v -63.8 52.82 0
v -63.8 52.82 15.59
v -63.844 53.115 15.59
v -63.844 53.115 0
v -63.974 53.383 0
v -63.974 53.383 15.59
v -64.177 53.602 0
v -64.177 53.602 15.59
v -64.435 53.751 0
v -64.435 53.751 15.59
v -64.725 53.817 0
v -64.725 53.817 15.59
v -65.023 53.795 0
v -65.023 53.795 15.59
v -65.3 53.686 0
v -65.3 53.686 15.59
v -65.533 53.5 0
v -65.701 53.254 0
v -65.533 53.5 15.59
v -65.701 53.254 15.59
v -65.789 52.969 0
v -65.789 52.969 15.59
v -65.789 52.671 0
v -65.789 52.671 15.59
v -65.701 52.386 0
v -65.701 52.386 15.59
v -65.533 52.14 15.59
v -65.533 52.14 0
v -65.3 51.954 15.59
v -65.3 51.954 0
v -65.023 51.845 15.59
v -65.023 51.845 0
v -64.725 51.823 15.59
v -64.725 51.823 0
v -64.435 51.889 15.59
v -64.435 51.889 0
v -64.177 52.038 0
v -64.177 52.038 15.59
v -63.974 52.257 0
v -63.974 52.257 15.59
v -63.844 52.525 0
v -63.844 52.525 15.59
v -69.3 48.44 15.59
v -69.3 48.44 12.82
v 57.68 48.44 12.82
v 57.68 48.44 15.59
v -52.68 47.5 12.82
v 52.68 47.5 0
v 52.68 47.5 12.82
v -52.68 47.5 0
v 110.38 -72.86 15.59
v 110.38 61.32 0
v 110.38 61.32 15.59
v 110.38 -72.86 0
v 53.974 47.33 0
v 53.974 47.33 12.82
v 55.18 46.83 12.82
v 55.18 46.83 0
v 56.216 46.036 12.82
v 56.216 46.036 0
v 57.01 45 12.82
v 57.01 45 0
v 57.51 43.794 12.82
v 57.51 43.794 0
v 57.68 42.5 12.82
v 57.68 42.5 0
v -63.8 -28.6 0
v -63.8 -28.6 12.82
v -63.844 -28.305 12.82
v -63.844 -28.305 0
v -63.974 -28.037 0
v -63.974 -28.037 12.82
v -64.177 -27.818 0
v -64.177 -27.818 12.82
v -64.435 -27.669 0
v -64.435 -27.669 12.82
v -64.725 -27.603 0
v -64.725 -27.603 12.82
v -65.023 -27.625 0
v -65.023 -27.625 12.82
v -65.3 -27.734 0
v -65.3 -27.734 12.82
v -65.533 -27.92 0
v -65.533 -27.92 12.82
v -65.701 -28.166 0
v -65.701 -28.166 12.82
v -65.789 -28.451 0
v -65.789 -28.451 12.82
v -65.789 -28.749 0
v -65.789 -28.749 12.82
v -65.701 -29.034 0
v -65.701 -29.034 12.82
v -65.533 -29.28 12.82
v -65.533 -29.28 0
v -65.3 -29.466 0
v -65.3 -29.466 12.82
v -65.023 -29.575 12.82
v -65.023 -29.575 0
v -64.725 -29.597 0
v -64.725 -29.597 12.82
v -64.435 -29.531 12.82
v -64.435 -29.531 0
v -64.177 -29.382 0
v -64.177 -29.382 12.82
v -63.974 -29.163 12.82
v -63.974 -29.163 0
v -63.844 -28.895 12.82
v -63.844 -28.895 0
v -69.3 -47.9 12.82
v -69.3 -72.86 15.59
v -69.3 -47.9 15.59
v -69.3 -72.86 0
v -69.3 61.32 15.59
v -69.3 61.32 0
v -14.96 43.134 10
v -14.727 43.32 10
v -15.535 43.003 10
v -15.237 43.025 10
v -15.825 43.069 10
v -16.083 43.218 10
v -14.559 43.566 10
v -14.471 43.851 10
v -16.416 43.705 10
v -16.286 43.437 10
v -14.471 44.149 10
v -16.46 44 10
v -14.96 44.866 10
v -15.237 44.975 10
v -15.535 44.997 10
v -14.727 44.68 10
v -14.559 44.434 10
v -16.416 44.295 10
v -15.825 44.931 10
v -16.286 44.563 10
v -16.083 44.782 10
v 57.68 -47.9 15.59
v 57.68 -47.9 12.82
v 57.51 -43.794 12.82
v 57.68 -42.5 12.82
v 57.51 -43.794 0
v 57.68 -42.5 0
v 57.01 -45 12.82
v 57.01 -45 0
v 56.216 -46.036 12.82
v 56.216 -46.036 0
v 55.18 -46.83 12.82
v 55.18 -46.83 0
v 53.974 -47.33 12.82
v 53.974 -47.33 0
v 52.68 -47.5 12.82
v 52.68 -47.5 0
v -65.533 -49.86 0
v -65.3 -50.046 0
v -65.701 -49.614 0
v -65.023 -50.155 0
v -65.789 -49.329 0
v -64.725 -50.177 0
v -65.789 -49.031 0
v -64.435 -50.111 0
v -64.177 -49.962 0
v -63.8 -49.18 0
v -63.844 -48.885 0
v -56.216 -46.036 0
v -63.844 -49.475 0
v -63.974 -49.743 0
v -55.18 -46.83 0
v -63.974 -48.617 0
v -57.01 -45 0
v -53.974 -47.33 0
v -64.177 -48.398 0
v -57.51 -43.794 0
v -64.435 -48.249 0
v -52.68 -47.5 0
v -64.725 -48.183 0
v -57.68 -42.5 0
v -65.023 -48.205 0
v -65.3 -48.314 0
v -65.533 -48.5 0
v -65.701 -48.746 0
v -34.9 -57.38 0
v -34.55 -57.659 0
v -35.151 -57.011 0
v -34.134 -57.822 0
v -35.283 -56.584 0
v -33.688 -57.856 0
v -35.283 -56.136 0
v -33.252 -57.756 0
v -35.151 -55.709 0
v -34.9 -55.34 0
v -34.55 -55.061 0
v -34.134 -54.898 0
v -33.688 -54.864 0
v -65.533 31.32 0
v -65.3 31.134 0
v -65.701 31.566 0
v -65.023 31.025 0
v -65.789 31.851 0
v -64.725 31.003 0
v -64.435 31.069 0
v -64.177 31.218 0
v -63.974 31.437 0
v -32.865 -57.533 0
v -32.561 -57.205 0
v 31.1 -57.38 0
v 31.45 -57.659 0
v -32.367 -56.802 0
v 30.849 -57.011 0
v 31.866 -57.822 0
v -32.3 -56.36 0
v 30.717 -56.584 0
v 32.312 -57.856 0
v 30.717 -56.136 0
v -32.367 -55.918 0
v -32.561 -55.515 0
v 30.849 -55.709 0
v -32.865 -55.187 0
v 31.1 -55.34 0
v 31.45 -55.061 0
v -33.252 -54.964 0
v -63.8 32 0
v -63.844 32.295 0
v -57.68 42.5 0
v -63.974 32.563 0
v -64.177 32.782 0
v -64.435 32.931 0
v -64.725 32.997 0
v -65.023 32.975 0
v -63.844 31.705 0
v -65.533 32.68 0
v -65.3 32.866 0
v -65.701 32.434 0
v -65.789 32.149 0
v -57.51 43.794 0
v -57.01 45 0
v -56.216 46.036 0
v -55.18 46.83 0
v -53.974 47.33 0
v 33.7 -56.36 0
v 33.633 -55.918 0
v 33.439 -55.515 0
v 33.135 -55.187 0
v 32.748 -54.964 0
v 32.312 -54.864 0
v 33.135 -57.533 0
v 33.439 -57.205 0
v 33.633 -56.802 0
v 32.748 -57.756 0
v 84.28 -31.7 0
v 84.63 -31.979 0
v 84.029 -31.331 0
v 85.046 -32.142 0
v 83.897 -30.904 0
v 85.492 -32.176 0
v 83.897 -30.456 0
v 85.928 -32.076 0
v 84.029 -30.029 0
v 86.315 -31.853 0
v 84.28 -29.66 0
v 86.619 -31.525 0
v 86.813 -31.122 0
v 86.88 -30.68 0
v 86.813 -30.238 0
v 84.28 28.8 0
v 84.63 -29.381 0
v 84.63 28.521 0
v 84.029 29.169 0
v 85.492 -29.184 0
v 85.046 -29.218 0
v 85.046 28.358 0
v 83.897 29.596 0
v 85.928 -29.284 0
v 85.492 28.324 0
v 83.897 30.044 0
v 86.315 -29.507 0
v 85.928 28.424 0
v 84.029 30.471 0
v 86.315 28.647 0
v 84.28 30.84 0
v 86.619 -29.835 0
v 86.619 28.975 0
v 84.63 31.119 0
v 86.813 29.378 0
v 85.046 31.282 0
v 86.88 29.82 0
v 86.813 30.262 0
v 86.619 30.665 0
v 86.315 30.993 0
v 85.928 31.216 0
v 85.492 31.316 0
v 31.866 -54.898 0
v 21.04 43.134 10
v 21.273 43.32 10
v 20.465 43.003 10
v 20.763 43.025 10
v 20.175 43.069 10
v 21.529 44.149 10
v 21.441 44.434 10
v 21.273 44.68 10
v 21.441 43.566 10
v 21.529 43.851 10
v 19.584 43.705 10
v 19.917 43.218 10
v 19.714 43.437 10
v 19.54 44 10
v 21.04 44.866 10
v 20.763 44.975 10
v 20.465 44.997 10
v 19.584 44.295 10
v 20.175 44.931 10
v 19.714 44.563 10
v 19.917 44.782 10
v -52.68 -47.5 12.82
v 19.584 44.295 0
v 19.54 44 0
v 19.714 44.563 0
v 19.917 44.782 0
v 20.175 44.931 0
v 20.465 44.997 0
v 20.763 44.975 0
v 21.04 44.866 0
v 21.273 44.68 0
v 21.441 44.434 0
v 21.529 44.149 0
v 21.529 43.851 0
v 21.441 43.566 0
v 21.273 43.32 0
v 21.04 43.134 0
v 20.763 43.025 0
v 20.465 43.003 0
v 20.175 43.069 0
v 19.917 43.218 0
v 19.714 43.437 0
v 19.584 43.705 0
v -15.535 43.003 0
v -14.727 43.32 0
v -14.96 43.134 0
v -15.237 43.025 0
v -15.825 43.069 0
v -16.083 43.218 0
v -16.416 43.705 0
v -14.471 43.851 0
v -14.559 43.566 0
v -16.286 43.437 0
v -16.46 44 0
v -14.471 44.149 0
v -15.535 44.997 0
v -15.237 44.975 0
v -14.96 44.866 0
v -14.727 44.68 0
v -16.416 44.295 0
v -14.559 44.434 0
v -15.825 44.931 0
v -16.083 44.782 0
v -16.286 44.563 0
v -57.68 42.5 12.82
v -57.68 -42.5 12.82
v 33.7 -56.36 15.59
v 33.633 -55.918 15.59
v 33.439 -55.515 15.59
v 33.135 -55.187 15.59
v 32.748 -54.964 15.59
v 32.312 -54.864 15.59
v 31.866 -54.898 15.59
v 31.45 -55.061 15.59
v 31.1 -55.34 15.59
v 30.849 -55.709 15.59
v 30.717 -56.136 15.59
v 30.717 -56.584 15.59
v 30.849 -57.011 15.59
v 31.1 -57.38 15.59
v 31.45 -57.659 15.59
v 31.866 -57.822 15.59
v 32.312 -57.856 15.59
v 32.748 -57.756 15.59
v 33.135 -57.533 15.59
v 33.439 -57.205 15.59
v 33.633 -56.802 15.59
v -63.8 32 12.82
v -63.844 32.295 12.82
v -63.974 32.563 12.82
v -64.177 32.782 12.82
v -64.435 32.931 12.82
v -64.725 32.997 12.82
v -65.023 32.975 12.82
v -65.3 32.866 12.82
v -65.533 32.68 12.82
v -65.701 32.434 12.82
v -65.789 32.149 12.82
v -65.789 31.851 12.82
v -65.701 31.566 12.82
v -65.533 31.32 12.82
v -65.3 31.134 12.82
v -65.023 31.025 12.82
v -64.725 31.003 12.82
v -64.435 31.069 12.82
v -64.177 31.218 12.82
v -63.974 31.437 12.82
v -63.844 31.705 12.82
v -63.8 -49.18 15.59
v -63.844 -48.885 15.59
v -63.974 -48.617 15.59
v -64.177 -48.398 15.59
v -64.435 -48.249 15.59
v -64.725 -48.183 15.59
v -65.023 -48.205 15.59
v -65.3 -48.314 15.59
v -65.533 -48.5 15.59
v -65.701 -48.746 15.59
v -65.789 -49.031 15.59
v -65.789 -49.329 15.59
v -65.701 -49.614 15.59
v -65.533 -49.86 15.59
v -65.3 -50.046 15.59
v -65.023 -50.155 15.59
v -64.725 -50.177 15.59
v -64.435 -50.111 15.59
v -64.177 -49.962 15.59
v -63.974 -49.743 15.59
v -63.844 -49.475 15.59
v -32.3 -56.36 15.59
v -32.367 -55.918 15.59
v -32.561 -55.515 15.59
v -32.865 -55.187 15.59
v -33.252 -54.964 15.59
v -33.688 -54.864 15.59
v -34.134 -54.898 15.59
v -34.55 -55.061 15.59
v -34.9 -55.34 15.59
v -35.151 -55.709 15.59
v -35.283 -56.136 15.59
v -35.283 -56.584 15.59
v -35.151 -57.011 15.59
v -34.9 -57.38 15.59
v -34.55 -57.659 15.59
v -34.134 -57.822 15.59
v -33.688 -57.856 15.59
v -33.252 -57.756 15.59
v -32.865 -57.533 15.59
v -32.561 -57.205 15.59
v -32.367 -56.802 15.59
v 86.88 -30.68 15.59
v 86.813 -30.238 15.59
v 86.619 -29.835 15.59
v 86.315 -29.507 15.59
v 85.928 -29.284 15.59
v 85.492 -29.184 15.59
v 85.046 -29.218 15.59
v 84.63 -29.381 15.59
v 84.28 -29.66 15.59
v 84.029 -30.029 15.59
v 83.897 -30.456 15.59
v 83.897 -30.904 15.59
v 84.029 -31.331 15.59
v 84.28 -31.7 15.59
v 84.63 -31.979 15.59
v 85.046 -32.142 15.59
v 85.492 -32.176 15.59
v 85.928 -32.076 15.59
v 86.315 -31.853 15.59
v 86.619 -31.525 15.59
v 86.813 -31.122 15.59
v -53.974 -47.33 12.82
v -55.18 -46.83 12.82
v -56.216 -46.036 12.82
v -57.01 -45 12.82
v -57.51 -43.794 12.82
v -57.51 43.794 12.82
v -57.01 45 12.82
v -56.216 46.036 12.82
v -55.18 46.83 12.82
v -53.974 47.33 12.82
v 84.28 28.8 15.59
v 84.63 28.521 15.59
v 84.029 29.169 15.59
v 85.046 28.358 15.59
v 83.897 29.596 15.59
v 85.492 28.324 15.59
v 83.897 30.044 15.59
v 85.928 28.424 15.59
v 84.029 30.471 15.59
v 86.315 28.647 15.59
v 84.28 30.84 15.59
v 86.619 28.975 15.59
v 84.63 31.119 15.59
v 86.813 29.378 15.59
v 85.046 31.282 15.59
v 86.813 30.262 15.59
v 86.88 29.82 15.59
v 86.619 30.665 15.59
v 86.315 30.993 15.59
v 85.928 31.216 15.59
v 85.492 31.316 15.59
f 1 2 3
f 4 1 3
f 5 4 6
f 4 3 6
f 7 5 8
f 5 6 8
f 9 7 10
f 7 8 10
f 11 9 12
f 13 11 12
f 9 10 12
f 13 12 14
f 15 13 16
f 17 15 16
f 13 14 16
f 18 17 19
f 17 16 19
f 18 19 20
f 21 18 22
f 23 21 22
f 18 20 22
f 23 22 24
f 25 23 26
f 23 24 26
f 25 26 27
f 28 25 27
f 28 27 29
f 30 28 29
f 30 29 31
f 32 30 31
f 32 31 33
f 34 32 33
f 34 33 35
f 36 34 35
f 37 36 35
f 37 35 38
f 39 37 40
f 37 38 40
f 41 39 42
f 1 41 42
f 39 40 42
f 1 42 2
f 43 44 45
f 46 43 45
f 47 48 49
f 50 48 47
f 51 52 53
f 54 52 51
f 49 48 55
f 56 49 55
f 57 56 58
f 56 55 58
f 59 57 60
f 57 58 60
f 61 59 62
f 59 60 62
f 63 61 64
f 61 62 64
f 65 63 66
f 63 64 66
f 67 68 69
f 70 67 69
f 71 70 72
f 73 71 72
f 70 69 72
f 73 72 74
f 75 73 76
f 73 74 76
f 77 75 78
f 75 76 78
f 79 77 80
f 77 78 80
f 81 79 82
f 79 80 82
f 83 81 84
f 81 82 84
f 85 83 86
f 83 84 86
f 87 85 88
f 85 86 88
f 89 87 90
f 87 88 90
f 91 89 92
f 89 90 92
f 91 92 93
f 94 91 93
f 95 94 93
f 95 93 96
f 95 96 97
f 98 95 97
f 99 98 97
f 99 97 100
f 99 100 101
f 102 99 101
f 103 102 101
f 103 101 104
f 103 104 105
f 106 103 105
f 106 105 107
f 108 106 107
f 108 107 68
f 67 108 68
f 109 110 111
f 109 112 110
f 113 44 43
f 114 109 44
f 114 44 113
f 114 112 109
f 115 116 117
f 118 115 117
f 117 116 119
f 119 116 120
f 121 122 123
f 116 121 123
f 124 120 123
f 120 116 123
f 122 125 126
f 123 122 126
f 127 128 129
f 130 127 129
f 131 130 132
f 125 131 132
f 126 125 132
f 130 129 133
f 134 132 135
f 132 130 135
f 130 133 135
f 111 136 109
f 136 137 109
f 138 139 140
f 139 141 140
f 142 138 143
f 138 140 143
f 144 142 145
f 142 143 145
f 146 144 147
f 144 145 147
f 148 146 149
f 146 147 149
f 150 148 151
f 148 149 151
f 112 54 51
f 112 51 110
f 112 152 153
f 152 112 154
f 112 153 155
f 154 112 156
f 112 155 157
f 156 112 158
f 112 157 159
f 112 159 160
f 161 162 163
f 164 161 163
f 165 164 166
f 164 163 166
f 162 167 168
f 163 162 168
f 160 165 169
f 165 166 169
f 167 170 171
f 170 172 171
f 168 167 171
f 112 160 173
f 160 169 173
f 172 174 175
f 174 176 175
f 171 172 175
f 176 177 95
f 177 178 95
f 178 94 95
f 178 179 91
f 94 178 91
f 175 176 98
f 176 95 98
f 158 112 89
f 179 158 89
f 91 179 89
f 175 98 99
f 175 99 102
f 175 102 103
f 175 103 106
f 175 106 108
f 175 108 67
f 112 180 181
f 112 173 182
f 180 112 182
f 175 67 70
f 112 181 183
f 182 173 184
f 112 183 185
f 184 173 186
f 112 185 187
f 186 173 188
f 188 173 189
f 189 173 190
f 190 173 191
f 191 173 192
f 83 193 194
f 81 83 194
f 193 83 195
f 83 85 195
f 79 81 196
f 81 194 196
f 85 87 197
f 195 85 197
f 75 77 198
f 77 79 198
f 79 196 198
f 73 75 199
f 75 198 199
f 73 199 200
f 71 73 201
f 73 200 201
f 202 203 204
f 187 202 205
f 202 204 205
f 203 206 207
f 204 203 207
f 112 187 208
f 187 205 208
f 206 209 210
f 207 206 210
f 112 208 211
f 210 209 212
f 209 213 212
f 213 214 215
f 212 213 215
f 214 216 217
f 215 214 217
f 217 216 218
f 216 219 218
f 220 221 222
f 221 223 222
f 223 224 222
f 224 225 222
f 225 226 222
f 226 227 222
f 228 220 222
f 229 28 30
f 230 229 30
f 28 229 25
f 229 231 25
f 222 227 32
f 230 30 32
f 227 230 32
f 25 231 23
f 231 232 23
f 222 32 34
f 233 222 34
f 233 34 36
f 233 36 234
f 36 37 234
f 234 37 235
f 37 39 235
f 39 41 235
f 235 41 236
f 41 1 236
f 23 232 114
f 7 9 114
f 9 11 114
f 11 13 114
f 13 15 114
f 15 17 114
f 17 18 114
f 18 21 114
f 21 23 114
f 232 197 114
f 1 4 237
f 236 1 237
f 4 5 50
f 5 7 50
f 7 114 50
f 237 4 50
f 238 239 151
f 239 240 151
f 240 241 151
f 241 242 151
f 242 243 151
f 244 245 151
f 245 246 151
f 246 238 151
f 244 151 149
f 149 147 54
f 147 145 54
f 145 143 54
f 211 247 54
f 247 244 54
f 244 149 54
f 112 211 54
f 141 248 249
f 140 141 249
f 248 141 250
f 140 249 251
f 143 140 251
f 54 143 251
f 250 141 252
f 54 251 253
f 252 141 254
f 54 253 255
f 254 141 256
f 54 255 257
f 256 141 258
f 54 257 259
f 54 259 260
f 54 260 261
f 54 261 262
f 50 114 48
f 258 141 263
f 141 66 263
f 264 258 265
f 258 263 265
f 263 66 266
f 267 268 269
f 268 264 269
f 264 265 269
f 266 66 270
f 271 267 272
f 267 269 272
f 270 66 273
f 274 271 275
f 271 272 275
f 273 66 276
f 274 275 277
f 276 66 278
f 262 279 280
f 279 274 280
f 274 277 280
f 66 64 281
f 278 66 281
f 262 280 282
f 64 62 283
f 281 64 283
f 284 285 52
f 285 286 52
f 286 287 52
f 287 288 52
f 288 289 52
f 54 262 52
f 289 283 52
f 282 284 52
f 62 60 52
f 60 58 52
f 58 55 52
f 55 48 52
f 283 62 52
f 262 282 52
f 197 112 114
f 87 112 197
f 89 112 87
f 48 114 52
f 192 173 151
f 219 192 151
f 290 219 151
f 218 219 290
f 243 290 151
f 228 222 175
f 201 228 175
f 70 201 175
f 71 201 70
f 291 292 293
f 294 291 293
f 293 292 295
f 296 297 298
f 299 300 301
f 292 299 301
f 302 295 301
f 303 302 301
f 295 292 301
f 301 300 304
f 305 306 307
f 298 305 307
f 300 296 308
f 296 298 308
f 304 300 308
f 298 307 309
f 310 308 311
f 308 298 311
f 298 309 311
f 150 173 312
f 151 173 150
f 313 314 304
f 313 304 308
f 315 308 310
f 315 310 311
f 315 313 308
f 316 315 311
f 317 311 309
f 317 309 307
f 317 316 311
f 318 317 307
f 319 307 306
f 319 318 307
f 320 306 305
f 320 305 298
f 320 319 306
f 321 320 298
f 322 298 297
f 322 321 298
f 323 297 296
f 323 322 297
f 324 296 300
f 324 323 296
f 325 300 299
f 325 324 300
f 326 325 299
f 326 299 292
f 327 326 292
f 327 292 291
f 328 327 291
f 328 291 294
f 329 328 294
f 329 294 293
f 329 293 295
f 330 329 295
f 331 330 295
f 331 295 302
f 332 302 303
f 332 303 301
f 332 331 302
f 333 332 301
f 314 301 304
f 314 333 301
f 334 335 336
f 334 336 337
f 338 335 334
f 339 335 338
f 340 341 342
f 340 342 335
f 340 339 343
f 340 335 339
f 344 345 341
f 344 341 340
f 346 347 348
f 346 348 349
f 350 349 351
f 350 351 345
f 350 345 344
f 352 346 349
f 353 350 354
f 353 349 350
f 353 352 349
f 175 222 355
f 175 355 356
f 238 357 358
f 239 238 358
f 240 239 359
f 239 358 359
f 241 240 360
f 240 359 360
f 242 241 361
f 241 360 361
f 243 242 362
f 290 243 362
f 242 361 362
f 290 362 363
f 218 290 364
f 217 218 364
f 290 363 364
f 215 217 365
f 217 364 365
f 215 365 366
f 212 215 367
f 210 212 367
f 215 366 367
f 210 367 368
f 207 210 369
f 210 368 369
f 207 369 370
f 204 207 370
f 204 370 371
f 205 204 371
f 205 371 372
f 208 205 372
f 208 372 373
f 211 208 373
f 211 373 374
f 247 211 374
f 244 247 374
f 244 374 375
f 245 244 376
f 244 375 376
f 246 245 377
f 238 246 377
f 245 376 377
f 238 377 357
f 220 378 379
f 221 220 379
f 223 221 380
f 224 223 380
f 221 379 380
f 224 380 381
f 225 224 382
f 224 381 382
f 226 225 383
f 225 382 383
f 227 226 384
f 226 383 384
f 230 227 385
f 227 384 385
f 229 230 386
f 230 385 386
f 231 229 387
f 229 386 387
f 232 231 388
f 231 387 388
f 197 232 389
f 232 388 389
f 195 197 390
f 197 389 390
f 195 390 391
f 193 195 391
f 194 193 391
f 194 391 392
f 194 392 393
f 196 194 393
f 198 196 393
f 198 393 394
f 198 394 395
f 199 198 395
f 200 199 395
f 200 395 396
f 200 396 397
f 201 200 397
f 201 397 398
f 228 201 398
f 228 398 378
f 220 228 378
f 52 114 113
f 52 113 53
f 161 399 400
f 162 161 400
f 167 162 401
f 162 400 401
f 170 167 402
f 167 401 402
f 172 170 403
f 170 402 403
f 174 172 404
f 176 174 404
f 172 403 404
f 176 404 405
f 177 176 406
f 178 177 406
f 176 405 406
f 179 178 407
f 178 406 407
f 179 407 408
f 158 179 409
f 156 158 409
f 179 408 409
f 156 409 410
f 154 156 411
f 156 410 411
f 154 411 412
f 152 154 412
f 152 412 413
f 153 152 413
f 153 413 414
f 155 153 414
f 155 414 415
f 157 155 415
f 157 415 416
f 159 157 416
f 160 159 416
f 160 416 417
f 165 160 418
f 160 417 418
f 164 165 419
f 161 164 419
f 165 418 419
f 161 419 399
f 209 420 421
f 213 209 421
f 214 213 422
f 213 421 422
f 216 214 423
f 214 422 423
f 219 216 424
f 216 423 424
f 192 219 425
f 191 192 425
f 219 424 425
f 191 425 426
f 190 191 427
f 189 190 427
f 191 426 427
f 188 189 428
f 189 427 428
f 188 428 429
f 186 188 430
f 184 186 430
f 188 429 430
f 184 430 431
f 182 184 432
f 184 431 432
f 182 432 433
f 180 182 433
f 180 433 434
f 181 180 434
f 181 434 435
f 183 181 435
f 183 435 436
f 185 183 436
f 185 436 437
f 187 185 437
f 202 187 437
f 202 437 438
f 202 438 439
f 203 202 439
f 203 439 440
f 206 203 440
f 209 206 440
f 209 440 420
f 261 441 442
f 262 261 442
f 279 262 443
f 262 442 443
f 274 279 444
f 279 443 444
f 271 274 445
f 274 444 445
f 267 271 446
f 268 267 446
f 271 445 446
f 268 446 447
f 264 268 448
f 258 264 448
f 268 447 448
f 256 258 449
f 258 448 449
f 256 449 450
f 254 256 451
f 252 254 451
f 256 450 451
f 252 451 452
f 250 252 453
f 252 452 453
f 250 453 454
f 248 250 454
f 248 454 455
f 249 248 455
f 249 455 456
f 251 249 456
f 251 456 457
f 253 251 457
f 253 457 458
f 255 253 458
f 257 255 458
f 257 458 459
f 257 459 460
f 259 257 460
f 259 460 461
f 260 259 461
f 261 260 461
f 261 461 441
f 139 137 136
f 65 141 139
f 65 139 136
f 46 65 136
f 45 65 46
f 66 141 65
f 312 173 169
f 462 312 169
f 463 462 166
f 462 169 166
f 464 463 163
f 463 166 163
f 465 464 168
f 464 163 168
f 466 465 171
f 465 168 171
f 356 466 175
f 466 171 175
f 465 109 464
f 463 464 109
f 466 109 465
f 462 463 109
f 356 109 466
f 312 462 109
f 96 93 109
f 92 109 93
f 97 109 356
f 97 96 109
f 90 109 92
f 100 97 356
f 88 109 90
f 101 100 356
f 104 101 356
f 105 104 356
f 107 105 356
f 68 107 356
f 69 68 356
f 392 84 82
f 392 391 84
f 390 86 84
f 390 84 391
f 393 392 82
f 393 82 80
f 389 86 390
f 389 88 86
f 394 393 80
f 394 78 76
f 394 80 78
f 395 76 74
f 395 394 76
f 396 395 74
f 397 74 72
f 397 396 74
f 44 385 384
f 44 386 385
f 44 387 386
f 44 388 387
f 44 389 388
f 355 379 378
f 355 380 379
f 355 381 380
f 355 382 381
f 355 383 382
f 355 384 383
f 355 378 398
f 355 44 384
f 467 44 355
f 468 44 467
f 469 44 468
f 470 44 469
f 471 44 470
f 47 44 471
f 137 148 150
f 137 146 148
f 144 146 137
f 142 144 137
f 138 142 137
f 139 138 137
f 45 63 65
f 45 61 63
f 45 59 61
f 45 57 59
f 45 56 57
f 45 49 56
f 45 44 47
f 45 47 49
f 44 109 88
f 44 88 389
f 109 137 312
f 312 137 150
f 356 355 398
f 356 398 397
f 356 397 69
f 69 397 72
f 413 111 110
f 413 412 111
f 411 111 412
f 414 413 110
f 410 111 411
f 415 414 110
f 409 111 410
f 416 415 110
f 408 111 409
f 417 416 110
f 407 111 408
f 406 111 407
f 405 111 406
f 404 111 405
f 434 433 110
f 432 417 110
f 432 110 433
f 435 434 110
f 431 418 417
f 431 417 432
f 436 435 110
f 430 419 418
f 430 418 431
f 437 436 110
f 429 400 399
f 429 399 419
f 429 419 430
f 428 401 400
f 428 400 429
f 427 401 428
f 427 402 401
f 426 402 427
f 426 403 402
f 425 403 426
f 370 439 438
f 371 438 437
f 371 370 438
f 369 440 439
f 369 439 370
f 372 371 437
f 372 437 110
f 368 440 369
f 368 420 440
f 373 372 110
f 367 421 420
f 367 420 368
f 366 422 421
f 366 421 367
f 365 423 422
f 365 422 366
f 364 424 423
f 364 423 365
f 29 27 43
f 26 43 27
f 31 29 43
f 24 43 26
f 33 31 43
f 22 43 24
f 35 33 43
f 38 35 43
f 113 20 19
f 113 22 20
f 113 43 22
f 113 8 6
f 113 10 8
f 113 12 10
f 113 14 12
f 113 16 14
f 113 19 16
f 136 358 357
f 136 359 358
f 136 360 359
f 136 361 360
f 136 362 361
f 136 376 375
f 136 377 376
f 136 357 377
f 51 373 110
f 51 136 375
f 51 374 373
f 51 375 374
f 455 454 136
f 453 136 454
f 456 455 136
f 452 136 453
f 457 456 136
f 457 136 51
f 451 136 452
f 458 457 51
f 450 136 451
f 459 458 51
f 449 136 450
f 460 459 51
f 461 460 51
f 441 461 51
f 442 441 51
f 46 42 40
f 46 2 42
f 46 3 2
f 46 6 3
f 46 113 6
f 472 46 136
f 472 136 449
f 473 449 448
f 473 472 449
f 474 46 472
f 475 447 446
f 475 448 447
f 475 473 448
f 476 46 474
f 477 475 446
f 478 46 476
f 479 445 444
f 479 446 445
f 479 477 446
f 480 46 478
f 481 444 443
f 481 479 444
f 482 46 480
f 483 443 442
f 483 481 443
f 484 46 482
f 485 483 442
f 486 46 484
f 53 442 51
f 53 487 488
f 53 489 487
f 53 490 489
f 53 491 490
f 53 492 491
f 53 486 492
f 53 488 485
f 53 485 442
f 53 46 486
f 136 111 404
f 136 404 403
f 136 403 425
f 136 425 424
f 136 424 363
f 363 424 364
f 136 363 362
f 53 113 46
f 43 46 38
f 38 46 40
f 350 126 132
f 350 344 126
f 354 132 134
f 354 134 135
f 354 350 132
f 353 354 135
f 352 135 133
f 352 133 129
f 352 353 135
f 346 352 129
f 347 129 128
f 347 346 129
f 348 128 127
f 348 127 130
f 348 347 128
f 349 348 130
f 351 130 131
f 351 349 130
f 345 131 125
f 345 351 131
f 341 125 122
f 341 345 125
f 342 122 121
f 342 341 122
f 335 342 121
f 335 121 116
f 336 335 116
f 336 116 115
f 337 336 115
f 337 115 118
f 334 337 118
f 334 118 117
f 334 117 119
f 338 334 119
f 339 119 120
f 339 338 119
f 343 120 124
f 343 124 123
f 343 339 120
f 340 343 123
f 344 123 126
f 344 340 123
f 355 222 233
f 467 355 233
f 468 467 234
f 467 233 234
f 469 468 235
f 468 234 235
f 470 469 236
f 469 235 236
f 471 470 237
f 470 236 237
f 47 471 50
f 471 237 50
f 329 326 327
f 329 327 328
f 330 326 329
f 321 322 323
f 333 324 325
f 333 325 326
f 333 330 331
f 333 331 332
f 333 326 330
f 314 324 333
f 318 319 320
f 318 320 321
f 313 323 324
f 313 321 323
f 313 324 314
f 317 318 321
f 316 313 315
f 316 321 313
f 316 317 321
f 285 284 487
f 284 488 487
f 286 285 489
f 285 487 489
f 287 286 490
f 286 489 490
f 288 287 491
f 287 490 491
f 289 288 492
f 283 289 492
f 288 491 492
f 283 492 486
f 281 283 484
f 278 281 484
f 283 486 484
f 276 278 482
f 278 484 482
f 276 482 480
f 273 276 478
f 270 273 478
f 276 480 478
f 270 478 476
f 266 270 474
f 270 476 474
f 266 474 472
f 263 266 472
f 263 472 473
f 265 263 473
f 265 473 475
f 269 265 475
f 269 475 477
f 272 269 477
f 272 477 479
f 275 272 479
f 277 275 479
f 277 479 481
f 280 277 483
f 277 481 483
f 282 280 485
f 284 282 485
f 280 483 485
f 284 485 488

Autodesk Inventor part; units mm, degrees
ref_plane "YZ Plane" through (0, 0, 0) normal (1, 0, 0) x (0, 1, 0)
ref_plane "XZ Plane" through (0, 0, 0) normal (0, 1, 0) x (-1, 0, 0)
ref_plane "XY Plane" through (0, 0, 0) normal (0, 0, 1) x (1, 0, 0)
sketch "Skizze1" plane through (0, 0, 0) normal (0, 0, 1) x (1, 0, 0)
  line L0 (52.68, 47.5) -> (-52.68, 47.5)
  line L1 (-57.68, 42.5) -> (-57.68, -42.5)
  line L2 (-52.68, -47.5) -> (52.68, -47.5)
  line L3 (57.68, -42.5) -> (57.68, 42.5)
  line L4 (57.68, 47.5) -> (-57.68, -47.5) construction
  line L5 (-57.68, 47.5) -> (57.68, -47.5) construction
  arc A0 (-52.68, 47.5) -> (-57.68, 42.5) centre (-52.68, 42.5) ccw
  arc A1 (57.68, 42.5) -> (52.68, 47.5) centre (52.68, 42.5) ccw
  arc A2 (52.68, -47.5) -> (57.68, -42.5) centre (52.68, -42.5) ccw
  arc A3 (-57.68, -42.5) -> (-52.68, -47.5) centre (-52.68, -42.5) ccw
  line L6 (110.38, -72.86) -> (-69.3, -72.86)
  line L7 (-69.3, -72.86) -> (-69.3, 61.32)
  line L8 (-69.3, 61.32) -> (110.38, 61.32)
  line L9 (110.38, 61.32) -> (110.38, -72.86)
  point P0 (0, 0)
  dimension "d0" = 115.36
  dimension "d1" = 95
  dimension "d2" = 5
  dimension "d3" = 52.7
  dimension "d4" = 25.36
  dimension "d5" = 11.62
  dimension "d6" = 13.82
extrude "Extrusion1" add sketch "Skizze1" along normal blind 12.82
sketch "Skizze2" plane through (0, 0, 12.82) normal (0, 0, 1) x (1, 0, 0)
  line L0 (110.38, 61.32) -> (-69.3, 61.32) projected
  line L1 (-69.3, 61.32) -> (-69.3, -72.86) projected
  line L2 (-69.3, -72.86) -> (110.38, -72.86) projected
  line L3 (110.38, -72.86) -> (110.38, 61.32) projected
  arc A0 (57.68, 42.5) -> (52.68, 47.5) centre (52.68, 42.5) ccw projected
  line L4 (57.68, 42.5) -> (57.68, -42.5) projected
  arc A1 (52.68, -47.5) -> (57.68, -42.5) centre (52.68, -42.5) ccw projected
  line L5 (52.68, -47.5) -> (-52.68, -47.5) projected
  arc A2 (-57.68, -42.5) -> (-52.68, -47.5) centre (-52.68, -42.5) ccw projected
  line L6 (-57.68, -42.5) -> (-57.68, 42.5) projected
  arc A3 (-52.68, 47.5) -> (-57.68, 42.5) centre (-52.68, 42.5) ccw projected
  line L7 (-52.68, 47.5) -> (52.68, 47.5) projected
  line L8 (-74.2294, 48.44) -> (57.68, 48.44)
  line L9 (57.68, 48.44) -> (57.68, -47.9)
  line L10 (57.68, -47.9) -> (-74.2294, -47.9)
  line L11 (-74.2294, -47.9) -> (-74.2294, 48.44)
  point P0 (0, 0)
  point P1 (-69.3, 48.44)
  point P2 (-69.3, -47.9)
  dimension "d9" = 12.88
  dimension "d10" = 0.4
extrude "Extrusion2" add sketch "Skizze2" along normal blind 2.77 contours L3 L2 L1 L10 L9 L4 L8 L0
sketch "Skizze3" plane through (0, 0, 15.59) normal (0, 0, 1) x (1, 0, 0)
  line L0 (-69.3, 61.32) -> (-69.3, 48.44) projected
  line L1 (-69.3, 48.44) -> (57.68, 48.44) projected
  line L2 (57.68, 48.44) -> (57.68, -47.9) projected
  line L3 (57.68, -47.9) -> (-69.3, -47.9) projected
  line L4 (-69.3, -47.9) -> (-69.3, -72.86) projected
  line L5 (-69.3, -72.86) -> (110.38, -72.86) projected
  line L6 (110.38, -72.86) -> (110.38, 61.32) projected
  line L7 (110.38, 61.32) -> (-69.3, 61.32) projected
  circle A0 centre (-64.8, 52.82) radius 1
  circle A1 centre (-64.8, 32) radius 1
  circle A2 centre (-64.8, -28.6) radius 1
  circle A3 centre (85.38, 29.82) radius 1.5
  circle A4 centre (85.38, -30.68) radius 1.5
  circle A5 centre (32.2, -56.36) radius 1.5
  circle A6 centre (-33.8, -56.36) radius 1.5
  circle A7 centre (-64.8, -49.18) radius 1
  line L8 (-69.3, 48.44) -> (-69.3, -47.9) projected
  point P0 (0, 0)
  dimension "d13" = 2
  dimension "d14" = 2
  dimension "d15" = 2
  dimension "d16" = 3
  dimension "d17" = 3
  dimension "d18" = 3
  dimension "d19" = 3
  dimension "d20" = 2
  dimension "d21" = 8.5
  dimension "d22" = 4.5
  dimension "d23" = 4.5
  dimension "d24" = 4.5
  dimension "d25" = 4.5
  dimension "d26" = 20.82
  dimension "d27" = 81.42
  dimension "d28" = 102
  dimension "d29" = 16.5
  dimension "d30" = 16.5
  dimension "d31" = 66
  dimension "d32" = 35.5
  dimension "d33" = 25
  dimension "d34" = 25
  dimension "d35" = 31.5
  dimension "d36" = 60.5
extrude "Extrusion3" cut sketch "Skizze3" against normal through all contours A0 | A1 | A2 | A3 | A4 | A5 | A6 | A7
sketch "Skizze4" plane through (0, 0, 0) normal (0, 0, -1) x (-1, 0, 0)
  circle A0 centre (-85.38, -30.68) radius 1.5 projected
  circle A1 centre (64.8, -28.6) radius 1 projected
  circle A2 centre (64.8, -49.18) radius 1 projected
  circle A3 centre (-85.38, 29.82) radius 1.5 projected
  circle A4 centre (-32.2, -56.36) radius 1.5 projected
  circle A5 centre (64.8, 32) radius 1 projected
  circle A6 centre (33.8, -56.36) radius 1.5 projected
  circle A7 centre (64.8, 52.82) radius 1 projected
  line L0 (-110.38, 61.32) -> (69.3, 61.32) projected
  line L1 (-110.38, -72.86) -> (-110.38, 61.32) projected
  line L2 (69.3, -72.86) -> (-110.38, -72.86) projected
  line L3 (69.3, 61.32) -> (69.3, -72.86) projected
  arc A8 (-52.68, 47.5) -> (-57.68, 42.5) centre (-52.68, 42.5) ccw projected
  line L4 (52.68, 47.5) -> (-52.68, 47.5) projected
  arc A9 (57.68, 42.5) -> (52.68, 47.5) centre (52.68, 42.5) ccw projected
  line L5 (57.68, -42.5) -> (57.68, 42.5) projected
  arc A10 (52.68, -47.5) -> (57.68, -42.5) centre (52.68, -42.5) ccw projected
  line L6 (-52.68, -47.5) -> (52.68, -47.5) projected
  arc A11 (-57.68, -42.5) -> (-52.68, -47.5) centre (-52.68, -42.5) ccw projected
  line L7 (-57.68, 42.5) -> (-57.68, -42.5) projected
  circle A12 centre (15.46, 44) radius 1
  circle A13 centre (-20.54, 44) radius 1
  point P0 (0, 0)
  dimension "d39" = 2
  dimension "d40" = 2
  dimension "d41" = 3.5
  dimension "d42" = 3.5
  dimension "d43" = 36
extrude "Extrusion4" add sketch "Skizze4" against normal blind 10 contours A12 | A13
ref_plane "Arbeitsebene1" through (0, -42.5, 0) normal (1, 0, 0) x (0, 0, -1)
properties part number "30_XYTabel_Aliexpress_xslide"
